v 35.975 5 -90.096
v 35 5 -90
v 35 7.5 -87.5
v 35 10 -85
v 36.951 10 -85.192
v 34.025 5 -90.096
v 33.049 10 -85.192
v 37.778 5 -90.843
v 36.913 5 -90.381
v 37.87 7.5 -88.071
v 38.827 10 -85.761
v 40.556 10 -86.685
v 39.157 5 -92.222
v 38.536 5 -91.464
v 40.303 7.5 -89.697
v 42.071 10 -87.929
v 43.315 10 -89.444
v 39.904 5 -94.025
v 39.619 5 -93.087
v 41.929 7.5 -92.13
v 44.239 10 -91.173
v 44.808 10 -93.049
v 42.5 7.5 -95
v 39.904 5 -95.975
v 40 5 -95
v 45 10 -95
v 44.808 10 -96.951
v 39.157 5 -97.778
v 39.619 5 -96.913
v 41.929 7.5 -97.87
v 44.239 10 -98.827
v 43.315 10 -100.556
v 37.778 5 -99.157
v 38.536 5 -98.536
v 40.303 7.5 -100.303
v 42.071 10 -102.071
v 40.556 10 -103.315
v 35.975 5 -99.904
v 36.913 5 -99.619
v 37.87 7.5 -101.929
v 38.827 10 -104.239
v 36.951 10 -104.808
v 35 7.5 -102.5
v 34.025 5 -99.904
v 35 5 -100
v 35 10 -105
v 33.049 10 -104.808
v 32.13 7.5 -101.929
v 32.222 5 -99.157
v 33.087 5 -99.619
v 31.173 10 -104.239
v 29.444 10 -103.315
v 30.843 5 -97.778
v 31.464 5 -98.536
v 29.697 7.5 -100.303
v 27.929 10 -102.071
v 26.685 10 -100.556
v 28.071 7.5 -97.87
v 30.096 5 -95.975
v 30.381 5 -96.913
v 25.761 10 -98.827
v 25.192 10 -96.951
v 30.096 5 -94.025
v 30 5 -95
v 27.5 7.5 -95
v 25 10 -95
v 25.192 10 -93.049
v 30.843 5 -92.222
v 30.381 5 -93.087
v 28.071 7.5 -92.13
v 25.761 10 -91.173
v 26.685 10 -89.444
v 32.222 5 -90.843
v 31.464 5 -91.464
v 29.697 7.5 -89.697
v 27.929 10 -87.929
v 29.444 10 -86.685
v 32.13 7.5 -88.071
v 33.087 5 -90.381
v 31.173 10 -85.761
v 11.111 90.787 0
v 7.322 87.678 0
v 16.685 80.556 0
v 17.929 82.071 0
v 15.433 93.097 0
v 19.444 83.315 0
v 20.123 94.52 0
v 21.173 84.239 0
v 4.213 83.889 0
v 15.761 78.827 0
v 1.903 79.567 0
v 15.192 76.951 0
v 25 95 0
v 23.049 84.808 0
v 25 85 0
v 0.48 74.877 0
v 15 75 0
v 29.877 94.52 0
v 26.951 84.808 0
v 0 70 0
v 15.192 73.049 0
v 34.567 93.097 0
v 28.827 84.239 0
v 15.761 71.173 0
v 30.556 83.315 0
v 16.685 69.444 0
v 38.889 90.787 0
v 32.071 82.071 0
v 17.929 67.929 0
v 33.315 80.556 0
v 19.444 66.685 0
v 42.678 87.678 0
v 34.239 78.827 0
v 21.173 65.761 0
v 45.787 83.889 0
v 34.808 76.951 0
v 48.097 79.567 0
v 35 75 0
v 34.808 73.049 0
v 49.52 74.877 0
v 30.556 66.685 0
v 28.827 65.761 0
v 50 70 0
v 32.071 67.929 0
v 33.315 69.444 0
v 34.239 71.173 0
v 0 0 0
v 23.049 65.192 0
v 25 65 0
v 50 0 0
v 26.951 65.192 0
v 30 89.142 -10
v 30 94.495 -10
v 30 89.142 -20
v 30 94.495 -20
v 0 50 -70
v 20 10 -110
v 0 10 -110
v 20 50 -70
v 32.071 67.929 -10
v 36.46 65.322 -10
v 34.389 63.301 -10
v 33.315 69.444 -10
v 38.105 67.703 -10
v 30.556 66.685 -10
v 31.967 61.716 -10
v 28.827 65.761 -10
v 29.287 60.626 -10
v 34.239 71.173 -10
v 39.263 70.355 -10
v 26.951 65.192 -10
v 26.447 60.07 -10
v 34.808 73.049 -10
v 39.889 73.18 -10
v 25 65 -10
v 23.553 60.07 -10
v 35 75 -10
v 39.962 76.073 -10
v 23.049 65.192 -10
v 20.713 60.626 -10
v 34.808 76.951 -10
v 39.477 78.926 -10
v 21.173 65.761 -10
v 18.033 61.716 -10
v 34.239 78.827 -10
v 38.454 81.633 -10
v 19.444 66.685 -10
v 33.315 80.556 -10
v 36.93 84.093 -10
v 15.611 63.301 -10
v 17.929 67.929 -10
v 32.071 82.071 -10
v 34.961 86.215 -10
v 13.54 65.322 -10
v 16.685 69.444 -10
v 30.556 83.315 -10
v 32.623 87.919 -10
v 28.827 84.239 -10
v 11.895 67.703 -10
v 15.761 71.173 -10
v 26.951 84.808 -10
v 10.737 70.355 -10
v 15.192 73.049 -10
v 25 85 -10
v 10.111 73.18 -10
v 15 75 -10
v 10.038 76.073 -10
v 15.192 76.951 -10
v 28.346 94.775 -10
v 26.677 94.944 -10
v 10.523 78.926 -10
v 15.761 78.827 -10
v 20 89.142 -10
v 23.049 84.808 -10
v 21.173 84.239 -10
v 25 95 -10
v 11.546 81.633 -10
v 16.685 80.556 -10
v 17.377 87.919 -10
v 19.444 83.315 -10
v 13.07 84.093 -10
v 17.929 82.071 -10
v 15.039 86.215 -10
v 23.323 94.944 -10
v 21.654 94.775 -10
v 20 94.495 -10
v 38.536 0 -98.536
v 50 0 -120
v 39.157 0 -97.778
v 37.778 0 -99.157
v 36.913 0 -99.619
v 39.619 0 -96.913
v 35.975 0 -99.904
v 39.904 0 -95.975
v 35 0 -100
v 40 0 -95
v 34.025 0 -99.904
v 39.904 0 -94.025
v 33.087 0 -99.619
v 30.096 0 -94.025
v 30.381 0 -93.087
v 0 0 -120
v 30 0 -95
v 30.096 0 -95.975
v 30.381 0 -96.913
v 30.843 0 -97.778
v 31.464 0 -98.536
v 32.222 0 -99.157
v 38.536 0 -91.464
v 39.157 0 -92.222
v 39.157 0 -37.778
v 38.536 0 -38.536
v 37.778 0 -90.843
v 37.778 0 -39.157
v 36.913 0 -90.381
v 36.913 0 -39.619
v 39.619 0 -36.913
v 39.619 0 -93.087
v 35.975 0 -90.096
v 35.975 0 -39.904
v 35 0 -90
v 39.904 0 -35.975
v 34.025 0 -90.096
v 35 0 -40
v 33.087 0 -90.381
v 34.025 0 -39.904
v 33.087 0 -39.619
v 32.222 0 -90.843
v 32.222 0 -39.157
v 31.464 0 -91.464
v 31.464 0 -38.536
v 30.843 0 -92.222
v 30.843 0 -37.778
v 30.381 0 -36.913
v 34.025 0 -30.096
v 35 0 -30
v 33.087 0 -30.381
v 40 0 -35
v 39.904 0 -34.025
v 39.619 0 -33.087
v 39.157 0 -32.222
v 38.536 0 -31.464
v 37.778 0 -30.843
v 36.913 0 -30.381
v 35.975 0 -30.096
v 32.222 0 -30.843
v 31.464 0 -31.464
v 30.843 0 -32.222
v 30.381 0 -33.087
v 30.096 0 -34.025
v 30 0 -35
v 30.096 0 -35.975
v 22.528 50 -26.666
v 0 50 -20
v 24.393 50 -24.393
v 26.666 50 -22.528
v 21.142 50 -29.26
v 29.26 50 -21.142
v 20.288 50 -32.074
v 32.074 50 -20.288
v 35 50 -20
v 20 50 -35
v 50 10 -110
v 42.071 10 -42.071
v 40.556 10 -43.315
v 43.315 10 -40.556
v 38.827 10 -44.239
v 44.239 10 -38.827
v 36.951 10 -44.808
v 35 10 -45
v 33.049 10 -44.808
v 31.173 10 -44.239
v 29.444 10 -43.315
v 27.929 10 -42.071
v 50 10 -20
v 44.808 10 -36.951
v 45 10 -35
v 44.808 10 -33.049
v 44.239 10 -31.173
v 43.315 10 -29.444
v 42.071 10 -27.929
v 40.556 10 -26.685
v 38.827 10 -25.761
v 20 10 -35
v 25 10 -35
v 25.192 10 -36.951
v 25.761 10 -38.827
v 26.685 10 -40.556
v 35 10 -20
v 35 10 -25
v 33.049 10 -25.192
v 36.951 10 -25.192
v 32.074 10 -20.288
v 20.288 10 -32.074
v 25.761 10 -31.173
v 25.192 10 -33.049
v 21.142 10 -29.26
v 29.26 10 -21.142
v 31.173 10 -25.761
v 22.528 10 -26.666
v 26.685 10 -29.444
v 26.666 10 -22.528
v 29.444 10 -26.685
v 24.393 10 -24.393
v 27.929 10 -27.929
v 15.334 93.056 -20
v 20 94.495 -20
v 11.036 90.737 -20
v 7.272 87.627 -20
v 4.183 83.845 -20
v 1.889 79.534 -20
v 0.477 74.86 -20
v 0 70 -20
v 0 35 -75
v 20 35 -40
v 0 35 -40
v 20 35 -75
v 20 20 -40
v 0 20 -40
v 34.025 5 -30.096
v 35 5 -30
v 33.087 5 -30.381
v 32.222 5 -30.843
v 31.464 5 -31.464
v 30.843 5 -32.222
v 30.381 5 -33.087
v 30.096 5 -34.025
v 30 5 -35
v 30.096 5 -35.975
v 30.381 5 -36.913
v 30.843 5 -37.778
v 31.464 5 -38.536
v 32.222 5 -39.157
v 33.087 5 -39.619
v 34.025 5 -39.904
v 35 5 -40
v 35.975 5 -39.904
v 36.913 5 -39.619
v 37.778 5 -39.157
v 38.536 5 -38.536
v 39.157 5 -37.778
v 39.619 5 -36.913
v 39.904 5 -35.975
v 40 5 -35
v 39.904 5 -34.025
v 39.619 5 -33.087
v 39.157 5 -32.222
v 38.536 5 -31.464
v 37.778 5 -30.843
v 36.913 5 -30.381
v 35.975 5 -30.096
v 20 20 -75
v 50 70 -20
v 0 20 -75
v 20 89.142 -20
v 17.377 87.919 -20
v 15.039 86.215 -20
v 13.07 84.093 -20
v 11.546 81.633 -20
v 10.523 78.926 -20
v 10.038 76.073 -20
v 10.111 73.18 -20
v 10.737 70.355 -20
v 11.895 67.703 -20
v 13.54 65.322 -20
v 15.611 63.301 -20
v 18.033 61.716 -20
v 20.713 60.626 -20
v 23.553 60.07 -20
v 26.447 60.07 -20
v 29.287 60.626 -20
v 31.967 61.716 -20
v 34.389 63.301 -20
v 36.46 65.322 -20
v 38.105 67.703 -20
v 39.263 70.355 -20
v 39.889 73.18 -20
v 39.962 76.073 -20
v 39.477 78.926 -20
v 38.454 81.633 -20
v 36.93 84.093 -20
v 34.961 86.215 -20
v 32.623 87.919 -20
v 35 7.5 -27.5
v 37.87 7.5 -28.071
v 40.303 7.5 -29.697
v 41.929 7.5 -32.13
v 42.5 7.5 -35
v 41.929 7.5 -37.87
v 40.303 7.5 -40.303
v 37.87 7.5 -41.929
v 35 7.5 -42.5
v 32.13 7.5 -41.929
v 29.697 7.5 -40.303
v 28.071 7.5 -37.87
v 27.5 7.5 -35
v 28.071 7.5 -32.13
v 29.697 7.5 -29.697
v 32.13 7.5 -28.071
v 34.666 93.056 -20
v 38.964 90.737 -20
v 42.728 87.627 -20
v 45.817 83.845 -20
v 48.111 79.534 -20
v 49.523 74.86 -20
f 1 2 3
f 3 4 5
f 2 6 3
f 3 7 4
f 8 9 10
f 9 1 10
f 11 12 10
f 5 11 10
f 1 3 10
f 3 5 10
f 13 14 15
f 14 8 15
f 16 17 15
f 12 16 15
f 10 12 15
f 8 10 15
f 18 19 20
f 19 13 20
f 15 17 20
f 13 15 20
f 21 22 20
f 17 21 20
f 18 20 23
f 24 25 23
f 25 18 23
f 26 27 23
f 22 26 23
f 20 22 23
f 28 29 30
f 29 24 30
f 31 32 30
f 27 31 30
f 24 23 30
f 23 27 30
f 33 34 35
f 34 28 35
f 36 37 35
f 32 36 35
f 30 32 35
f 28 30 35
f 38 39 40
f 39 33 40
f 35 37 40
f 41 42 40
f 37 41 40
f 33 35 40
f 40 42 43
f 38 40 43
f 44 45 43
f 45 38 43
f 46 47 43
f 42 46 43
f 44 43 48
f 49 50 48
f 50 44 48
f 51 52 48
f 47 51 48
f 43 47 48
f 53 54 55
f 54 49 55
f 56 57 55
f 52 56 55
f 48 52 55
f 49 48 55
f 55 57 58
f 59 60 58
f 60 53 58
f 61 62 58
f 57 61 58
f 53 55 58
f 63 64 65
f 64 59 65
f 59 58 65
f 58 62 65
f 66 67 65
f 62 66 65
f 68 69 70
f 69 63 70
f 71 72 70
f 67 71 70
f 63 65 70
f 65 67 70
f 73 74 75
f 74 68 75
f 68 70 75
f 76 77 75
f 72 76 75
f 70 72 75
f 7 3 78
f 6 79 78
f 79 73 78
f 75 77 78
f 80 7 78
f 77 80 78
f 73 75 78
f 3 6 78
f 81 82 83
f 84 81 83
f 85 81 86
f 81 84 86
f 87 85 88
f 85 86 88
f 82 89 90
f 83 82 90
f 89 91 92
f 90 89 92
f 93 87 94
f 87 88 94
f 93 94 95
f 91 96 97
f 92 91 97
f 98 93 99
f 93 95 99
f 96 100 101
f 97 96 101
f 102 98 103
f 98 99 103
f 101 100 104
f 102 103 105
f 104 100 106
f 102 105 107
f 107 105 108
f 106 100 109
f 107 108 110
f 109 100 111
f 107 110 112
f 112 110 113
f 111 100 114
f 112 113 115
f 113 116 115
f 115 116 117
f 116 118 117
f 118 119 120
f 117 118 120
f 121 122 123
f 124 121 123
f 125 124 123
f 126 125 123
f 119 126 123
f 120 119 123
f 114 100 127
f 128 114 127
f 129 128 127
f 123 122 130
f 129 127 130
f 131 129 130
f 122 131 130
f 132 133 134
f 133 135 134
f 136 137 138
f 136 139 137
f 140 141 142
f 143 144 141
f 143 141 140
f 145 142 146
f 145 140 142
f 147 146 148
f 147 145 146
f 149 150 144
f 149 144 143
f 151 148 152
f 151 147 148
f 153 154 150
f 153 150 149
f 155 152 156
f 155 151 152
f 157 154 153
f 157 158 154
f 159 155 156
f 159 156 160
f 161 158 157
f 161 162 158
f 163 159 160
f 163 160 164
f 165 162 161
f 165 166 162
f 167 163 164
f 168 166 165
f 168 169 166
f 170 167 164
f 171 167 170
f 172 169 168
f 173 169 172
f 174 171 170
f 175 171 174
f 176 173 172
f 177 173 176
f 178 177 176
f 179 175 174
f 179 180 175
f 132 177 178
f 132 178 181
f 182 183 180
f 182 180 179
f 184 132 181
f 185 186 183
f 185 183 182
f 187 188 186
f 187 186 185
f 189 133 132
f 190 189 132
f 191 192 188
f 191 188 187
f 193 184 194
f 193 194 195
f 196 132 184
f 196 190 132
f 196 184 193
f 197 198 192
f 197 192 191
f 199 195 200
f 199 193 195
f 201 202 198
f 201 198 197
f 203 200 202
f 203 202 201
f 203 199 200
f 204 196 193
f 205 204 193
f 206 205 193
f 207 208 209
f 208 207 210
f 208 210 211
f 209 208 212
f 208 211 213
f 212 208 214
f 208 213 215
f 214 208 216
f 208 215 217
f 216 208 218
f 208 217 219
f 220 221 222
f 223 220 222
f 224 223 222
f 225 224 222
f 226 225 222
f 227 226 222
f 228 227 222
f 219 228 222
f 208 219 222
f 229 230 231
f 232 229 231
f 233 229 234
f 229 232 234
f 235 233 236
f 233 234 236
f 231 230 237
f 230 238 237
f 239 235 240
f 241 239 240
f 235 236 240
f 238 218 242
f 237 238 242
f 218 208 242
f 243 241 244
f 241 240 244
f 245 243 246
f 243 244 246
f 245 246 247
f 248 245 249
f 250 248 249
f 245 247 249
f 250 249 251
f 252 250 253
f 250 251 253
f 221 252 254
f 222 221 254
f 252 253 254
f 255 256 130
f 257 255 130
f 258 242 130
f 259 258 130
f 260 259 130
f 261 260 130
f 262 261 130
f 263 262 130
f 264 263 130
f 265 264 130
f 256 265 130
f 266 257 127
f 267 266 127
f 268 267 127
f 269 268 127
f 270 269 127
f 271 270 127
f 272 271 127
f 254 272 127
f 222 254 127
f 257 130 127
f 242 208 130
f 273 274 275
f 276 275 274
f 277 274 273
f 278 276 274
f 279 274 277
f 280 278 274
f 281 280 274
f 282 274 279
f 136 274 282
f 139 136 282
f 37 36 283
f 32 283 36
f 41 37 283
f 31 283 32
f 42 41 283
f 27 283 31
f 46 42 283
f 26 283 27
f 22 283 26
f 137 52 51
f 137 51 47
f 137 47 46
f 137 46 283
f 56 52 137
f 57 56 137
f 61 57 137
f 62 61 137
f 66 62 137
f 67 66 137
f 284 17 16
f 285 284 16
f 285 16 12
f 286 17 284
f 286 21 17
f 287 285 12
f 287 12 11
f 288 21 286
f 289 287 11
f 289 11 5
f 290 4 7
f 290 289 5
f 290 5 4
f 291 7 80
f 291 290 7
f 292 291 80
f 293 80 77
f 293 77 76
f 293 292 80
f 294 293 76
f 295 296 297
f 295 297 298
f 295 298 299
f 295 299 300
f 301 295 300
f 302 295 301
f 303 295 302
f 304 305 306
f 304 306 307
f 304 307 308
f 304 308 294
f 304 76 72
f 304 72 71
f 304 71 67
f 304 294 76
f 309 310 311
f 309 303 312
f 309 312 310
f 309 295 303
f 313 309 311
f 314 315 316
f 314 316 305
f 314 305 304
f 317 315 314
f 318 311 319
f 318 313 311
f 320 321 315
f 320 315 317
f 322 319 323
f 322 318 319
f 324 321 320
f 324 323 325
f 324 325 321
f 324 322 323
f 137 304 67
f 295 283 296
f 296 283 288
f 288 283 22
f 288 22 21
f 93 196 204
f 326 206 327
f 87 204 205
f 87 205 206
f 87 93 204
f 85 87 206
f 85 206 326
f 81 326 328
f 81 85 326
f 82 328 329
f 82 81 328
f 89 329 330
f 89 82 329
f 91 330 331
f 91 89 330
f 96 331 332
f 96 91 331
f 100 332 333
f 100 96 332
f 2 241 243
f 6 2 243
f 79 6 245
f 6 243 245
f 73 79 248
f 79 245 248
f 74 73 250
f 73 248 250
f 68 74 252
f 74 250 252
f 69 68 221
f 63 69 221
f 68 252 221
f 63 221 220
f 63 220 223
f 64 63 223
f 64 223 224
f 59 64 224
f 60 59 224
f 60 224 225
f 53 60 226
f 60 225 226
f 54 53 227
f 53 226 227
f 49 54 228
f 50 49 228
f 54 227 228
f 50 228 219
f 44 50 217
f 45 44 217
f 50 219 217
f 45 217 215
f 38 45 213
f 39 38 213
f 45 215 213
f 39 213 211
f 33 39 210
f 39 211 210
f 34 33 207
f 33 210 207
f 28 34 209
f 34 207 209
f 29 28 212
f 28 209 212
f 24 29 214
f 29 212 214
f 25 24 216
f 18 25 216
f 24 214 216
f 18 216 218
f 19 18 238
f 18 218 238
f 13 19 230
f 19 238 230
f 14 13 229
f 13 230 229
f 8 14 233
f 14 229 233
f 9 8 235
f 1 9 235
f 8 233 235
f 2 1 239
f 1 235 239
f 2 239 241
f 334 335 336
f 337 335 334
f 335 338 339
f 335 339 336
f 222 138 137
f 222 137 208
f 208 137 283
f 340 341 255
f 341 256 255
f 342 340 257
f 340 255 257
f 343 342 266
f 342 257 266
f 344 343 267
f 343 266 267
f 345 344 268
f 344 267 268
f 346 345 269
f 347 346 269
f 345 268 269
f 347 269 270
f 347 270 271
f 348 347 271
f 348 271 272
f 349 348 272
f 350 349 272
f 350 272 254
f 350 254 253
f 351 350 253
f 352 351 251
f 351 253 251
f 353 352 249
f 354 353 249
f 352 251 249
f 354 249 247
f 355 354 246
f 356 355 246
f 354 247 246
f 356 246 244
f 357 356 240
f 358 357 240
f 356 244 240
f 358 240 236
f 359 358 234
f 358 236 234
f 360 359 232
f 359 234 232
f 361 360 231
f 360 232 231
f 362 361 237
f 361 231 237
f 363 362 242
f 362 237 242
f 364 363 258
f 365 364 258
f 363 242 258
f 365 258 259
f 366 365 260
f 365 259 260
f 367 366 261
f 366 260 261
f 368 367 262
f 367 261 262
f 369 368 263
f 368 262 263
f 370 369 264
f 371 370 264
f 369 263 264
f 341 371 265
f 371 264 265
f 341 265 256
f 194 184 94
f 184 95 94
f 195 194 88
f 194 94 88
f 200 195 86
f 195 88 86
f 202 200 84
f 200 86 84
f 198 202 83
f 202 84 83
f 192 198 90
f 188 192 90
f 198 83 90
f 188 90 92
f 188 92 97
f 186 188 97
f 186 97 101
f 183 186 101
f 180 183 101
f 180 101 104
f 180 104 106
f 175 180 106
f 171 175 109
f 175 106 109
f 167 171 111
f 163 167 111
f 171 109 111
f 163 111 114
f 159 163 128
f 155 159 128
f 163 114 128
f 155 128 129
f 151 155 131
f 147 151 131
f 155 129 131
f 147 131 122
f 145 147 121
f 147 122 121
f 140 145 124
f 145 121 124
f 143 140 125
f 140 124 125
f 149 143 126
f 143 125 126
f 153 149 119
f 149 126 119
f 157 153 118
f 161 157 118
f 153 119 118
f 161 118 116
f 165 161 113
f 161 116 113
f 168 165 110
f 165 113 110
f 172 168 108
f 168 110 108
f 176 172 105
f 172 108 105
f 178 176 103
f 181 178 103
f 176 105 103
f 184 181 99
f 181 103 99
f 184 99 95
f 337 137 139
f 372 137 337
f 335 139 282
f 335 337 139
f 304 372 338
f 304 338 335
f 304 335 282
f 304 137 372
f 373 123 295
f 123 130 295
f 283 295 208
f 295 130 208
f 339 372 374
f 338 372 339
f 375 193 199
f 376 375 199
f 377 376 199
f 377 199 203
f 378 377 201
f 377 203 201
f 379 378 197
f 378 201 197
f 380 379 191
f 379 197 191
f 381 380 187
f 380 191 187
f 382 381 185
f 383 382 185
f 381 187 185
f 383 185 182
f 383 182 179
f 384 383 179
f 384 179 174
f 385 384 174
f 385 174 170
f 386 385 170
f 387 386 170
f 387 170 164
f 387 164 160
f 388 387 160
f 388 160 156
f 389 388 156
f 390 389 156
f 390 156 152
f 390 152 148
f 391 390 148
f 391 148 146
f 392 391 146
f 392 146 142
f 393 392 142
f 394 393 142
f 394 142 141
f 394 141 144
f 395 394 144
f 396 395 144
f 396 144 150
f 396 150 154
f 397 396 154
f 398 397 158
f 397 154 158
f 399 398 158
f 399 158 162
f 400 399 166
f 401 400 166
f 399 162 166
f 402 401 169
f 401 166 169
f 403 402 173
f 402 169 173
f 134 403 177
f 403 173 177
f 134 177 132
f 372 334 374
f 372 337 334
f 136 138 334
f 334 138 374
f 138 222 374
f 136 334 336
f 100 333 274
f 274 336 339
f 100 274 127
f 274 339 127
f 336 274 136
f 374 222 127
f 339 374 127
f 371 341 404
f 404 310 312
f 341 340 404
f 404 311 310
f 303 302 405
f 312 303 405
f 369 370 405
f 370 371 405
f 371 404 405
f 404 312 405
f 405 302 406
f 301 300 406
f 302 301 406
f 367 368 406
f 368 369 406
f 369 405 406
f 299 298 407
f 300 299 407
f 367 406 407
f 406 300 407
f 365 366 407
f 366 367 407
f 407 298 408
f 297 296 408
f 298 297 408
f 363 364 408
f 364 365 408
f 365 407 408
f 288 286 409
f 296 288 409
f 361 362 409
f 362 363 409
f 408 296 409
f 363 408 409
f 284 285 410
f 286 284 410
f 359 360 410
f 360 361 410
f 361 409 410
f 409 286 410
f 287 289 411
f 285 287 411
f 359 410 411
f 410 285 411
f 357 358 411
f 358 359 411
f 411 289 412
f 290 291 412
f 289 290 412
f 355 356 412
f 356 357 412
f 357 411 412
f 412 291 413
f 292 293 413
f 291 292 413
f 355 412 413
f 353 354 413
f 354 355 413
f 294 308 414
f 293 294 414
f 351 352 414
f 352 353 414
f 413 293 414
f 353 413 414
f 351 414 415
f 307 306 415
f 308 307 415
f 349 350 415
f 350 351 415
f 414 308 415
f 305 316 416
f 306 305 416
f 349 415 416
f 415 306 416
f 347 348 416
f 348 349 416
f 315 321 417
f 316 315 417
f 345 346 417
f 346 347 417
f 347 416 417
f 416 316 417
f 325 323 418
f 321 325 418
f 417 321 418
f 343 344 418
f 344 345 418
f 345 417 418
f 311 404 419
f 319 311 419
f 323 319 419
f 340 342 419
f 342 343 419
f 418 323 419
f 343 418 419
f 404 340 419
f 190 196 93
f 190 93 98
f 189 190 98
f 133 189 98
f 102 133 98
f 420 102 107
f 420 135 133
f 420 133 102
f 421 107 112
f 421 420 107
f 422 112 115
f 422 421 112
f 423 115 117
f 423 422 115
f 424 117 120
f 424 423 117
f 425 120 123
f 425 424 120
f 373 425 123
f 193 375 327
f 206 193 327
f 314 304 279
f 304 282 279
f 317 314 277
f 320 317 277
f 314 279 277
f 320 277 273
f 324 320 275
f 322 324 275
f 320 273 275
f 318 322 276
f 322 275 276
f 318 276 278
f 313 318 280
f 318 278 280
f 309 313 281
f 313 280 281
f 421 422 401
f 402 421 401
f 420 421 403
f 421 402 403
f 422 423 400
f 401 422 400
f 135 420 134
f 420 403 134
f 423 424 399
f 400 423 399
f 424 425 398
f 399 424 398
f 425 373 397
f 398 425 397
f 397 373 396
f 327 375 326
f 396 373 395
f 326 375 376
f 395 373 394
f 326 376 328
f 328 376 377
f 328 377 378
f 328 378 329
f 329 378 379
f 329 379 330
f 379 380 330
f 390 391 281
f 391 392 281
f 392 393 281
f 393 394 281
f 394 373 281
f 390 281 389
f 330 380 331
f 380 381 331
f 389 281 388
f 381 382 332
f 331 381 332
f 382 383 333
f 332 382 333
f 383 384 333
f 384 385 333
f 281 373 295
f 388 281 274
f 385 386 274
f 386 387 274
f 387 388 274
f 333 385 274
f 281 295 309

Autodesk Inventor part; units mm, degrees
ref_plane "YZ Plane" through (0, 0, 0) normal (1, 0, 0) x (0, 1, 0)
ref_plane "XZ Plane" through (0, 0, 0) normal (0, 1, 0) x (-1, 0, 0)
ref_plane "XY Plane" through (0, 0, 0) normal (0, 0, 1) x (1, 0, 0)
sketch "Sketch1" plane through (0, 0, 0) normal (0, 1, 0) x (-1, 0, 0)
  line L0 (0, 0) -> (-50, 0)
  line L1 (-50, 0) -> (-50, -120)
  line L2 (-50, -120) -> (0, -120)
  line L3 (0, -120) -> (0, 0)
  dimension "d0" = 50
  dimension "d1" = 120
extrude "Extrusion1" add sketch "Sketch1" along normal blind 10
sketch "Sketch2" plane through (0, 10, 0) normal (0, 1, 0) x (1, 0, 0)
  line L0 (0, 0) -> (50, 0)
  line L1 (50, 0) -> (50, 20)
  line L2 (50, 20) -> (0, 20)
  line L3 (0, 20) -> (0, 0)
  dimension "d4" = 50
  dimension "d5" = 20
extrude "Extrusion2" add sketch "Sketch2" along normal blind 85
chamfer "Chamfer1" distance 10 angle 45 1 edges at (25, 10, -120)
sketch "Sketch3" plane through (0, 10, 0) normal (0, 1, 0) x (1, 0, 0)
  line L0 (0, 110) -> (0, 20) projected
  line L1 (0, 20) -> (50, 20) projected
  line L2 (0, 110) -> (20, 110)
  line L3 (20, 110) -> (20, 20)
  line L4 (20, 20) -> (0, 20)
  line L5 (0, 20) -> (0, 110)
  point P0 (0, 0)
  dimension "d11" = 20
extrude "Extrusion3" add sketch "Sketch3" along normal blind 40
chamfer "Chamfer2" distance 40 angle 45 1 edges at (10, 50, -110)
fillet "Fillet1" radius 15 1 edges at (20, 30, -20)
sketch "Sketch4" plane through (50, 95, -20) normal (0, 0, -1) x (-1, 0, 0)
  point P0 (50, -95)
  point P1 (25, -20)
hole "Hole1" at (25, 75, -20) direction (0, 0, 1) diameter 20 depth 20 tip angle 118 counterbore diameter 30 counterbore depth 10
fillet "Fillet2" radius 25 2 edges at (50, 95, -10) (0, 95, -10)
sketch "Sketch5" plane through (0, 10, 0) normal (0, 1, 0) x (1, 0, 0)
  line L0 (35, 35) -> (35, 95)
  point P0 (0, 0)
  dimension "d26" = 60
hole "Hole2" at (35, 10, -35) at (35, 10, -95) direction (0, -1, 0) diameter 10 depth 10 tip angle 118 countersink diameter 20 countersink angle 90
sketch "Sketch6" plane through (50, 10, -20) normal (0, 0, -1) x (-1, 0, 0)
  line L0 (20, 79) -> (30, 79)
  line L1 (30, 79) -> (30, 86.8566)
  line L2 (30, 86.8566) -> (20, 86.8566)
  line L3 (20, 86.8566) -> (20, 79)
  point P0 (50, -10)
extrude "Extrusion4" cut sketch "Sketch6" against normal blind 10
sketch "Sketch7" plane through (20, 10, -35) normal (1, 0, 0) x (0, 0, -1)
  line L0 (5, 25) -> (40, 25)
  line L1 (40, 25) -> (40, 10)
  line L2 (40, 10) -> (5, 10)
  line L3 (5, 10) -> (5, 25)
  point P0 (-35, -10)
extrude "Extrusion5" cut sketch "Sketch7" against normal blind 20
properties part number "Part1 Drawing"
